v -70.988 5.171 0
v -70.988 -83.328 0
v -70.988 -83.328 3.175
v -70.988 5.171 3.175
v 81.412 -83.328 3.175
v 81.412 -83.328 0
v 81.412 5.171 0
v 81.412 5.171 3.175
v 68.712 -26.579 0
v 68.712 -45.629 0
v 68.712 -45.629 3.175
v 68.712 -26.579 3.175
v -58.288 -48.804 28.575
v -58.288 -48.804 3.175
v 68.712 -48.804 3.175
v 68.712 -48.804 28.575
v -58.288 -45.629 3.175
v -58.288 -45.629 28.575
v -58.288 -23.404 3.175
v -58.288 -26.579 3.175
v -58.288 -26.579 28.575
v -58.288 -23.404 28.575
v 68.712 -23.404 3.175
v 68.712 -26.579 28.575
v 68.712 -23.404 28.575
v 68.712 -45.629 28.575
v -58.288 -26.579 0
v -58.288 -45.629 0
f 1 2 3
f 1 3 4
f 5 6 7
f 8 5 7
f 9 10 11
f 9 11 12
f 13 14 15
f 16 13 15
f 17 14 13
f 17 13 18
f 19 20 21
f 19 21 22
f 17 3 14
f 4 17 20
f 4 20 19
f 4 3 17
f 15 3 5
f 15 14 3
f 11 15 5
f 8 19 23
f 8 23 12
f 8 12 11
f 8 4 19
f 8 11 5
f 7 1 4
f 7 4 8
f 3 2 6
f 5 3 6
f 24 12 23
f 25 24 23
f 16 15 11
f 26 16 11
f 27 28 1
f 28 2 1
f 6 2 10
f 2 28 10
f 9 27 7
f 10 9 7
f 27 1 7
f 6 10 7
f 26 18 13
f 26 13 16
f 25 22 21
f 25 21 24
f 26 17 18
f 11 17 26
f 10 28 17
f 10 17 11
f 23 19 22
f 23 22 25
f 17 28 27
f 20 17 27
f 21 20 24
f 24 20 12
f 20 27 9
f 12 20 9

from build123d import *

# Parameters (mm, degrees)
F1_W     = 152.4
F1_H     = 88.498586
F1_W_2   = 127
F1_H_2   = 19.05
F2_DEPTH = 3.175
F3_W     = 127
F3_H     = 3.175
F4_DEPTH = 25.4


with BuildPart() as f2:
    # F1 (on face) → F2 (new body)
    with BuildSketch(Plane.XY):
        with Locations((5.21198, -39.078306)):
            Rectangle(F1_W, F1_H)
        with Locations((5.21198, -36.104013)):
            Rectangle(F1_W_2, F1_H_2, mode=Mode.SUBTRACT)
    extrude(amount=F2_DEPTH)

    # F3 (on face) → F4 (join)
    with BuildSketch(Plane.XY.offset(3.175)):
        with Locations((5.21198, -24.991513)):
            Rectangle(F3_W, F3_H)
        with Locations((5.21198, -47.216513)):
            Rectangle(F3_W, F3_H)
    extrude(amount=F4_DEPTH)


solid = f2.part
